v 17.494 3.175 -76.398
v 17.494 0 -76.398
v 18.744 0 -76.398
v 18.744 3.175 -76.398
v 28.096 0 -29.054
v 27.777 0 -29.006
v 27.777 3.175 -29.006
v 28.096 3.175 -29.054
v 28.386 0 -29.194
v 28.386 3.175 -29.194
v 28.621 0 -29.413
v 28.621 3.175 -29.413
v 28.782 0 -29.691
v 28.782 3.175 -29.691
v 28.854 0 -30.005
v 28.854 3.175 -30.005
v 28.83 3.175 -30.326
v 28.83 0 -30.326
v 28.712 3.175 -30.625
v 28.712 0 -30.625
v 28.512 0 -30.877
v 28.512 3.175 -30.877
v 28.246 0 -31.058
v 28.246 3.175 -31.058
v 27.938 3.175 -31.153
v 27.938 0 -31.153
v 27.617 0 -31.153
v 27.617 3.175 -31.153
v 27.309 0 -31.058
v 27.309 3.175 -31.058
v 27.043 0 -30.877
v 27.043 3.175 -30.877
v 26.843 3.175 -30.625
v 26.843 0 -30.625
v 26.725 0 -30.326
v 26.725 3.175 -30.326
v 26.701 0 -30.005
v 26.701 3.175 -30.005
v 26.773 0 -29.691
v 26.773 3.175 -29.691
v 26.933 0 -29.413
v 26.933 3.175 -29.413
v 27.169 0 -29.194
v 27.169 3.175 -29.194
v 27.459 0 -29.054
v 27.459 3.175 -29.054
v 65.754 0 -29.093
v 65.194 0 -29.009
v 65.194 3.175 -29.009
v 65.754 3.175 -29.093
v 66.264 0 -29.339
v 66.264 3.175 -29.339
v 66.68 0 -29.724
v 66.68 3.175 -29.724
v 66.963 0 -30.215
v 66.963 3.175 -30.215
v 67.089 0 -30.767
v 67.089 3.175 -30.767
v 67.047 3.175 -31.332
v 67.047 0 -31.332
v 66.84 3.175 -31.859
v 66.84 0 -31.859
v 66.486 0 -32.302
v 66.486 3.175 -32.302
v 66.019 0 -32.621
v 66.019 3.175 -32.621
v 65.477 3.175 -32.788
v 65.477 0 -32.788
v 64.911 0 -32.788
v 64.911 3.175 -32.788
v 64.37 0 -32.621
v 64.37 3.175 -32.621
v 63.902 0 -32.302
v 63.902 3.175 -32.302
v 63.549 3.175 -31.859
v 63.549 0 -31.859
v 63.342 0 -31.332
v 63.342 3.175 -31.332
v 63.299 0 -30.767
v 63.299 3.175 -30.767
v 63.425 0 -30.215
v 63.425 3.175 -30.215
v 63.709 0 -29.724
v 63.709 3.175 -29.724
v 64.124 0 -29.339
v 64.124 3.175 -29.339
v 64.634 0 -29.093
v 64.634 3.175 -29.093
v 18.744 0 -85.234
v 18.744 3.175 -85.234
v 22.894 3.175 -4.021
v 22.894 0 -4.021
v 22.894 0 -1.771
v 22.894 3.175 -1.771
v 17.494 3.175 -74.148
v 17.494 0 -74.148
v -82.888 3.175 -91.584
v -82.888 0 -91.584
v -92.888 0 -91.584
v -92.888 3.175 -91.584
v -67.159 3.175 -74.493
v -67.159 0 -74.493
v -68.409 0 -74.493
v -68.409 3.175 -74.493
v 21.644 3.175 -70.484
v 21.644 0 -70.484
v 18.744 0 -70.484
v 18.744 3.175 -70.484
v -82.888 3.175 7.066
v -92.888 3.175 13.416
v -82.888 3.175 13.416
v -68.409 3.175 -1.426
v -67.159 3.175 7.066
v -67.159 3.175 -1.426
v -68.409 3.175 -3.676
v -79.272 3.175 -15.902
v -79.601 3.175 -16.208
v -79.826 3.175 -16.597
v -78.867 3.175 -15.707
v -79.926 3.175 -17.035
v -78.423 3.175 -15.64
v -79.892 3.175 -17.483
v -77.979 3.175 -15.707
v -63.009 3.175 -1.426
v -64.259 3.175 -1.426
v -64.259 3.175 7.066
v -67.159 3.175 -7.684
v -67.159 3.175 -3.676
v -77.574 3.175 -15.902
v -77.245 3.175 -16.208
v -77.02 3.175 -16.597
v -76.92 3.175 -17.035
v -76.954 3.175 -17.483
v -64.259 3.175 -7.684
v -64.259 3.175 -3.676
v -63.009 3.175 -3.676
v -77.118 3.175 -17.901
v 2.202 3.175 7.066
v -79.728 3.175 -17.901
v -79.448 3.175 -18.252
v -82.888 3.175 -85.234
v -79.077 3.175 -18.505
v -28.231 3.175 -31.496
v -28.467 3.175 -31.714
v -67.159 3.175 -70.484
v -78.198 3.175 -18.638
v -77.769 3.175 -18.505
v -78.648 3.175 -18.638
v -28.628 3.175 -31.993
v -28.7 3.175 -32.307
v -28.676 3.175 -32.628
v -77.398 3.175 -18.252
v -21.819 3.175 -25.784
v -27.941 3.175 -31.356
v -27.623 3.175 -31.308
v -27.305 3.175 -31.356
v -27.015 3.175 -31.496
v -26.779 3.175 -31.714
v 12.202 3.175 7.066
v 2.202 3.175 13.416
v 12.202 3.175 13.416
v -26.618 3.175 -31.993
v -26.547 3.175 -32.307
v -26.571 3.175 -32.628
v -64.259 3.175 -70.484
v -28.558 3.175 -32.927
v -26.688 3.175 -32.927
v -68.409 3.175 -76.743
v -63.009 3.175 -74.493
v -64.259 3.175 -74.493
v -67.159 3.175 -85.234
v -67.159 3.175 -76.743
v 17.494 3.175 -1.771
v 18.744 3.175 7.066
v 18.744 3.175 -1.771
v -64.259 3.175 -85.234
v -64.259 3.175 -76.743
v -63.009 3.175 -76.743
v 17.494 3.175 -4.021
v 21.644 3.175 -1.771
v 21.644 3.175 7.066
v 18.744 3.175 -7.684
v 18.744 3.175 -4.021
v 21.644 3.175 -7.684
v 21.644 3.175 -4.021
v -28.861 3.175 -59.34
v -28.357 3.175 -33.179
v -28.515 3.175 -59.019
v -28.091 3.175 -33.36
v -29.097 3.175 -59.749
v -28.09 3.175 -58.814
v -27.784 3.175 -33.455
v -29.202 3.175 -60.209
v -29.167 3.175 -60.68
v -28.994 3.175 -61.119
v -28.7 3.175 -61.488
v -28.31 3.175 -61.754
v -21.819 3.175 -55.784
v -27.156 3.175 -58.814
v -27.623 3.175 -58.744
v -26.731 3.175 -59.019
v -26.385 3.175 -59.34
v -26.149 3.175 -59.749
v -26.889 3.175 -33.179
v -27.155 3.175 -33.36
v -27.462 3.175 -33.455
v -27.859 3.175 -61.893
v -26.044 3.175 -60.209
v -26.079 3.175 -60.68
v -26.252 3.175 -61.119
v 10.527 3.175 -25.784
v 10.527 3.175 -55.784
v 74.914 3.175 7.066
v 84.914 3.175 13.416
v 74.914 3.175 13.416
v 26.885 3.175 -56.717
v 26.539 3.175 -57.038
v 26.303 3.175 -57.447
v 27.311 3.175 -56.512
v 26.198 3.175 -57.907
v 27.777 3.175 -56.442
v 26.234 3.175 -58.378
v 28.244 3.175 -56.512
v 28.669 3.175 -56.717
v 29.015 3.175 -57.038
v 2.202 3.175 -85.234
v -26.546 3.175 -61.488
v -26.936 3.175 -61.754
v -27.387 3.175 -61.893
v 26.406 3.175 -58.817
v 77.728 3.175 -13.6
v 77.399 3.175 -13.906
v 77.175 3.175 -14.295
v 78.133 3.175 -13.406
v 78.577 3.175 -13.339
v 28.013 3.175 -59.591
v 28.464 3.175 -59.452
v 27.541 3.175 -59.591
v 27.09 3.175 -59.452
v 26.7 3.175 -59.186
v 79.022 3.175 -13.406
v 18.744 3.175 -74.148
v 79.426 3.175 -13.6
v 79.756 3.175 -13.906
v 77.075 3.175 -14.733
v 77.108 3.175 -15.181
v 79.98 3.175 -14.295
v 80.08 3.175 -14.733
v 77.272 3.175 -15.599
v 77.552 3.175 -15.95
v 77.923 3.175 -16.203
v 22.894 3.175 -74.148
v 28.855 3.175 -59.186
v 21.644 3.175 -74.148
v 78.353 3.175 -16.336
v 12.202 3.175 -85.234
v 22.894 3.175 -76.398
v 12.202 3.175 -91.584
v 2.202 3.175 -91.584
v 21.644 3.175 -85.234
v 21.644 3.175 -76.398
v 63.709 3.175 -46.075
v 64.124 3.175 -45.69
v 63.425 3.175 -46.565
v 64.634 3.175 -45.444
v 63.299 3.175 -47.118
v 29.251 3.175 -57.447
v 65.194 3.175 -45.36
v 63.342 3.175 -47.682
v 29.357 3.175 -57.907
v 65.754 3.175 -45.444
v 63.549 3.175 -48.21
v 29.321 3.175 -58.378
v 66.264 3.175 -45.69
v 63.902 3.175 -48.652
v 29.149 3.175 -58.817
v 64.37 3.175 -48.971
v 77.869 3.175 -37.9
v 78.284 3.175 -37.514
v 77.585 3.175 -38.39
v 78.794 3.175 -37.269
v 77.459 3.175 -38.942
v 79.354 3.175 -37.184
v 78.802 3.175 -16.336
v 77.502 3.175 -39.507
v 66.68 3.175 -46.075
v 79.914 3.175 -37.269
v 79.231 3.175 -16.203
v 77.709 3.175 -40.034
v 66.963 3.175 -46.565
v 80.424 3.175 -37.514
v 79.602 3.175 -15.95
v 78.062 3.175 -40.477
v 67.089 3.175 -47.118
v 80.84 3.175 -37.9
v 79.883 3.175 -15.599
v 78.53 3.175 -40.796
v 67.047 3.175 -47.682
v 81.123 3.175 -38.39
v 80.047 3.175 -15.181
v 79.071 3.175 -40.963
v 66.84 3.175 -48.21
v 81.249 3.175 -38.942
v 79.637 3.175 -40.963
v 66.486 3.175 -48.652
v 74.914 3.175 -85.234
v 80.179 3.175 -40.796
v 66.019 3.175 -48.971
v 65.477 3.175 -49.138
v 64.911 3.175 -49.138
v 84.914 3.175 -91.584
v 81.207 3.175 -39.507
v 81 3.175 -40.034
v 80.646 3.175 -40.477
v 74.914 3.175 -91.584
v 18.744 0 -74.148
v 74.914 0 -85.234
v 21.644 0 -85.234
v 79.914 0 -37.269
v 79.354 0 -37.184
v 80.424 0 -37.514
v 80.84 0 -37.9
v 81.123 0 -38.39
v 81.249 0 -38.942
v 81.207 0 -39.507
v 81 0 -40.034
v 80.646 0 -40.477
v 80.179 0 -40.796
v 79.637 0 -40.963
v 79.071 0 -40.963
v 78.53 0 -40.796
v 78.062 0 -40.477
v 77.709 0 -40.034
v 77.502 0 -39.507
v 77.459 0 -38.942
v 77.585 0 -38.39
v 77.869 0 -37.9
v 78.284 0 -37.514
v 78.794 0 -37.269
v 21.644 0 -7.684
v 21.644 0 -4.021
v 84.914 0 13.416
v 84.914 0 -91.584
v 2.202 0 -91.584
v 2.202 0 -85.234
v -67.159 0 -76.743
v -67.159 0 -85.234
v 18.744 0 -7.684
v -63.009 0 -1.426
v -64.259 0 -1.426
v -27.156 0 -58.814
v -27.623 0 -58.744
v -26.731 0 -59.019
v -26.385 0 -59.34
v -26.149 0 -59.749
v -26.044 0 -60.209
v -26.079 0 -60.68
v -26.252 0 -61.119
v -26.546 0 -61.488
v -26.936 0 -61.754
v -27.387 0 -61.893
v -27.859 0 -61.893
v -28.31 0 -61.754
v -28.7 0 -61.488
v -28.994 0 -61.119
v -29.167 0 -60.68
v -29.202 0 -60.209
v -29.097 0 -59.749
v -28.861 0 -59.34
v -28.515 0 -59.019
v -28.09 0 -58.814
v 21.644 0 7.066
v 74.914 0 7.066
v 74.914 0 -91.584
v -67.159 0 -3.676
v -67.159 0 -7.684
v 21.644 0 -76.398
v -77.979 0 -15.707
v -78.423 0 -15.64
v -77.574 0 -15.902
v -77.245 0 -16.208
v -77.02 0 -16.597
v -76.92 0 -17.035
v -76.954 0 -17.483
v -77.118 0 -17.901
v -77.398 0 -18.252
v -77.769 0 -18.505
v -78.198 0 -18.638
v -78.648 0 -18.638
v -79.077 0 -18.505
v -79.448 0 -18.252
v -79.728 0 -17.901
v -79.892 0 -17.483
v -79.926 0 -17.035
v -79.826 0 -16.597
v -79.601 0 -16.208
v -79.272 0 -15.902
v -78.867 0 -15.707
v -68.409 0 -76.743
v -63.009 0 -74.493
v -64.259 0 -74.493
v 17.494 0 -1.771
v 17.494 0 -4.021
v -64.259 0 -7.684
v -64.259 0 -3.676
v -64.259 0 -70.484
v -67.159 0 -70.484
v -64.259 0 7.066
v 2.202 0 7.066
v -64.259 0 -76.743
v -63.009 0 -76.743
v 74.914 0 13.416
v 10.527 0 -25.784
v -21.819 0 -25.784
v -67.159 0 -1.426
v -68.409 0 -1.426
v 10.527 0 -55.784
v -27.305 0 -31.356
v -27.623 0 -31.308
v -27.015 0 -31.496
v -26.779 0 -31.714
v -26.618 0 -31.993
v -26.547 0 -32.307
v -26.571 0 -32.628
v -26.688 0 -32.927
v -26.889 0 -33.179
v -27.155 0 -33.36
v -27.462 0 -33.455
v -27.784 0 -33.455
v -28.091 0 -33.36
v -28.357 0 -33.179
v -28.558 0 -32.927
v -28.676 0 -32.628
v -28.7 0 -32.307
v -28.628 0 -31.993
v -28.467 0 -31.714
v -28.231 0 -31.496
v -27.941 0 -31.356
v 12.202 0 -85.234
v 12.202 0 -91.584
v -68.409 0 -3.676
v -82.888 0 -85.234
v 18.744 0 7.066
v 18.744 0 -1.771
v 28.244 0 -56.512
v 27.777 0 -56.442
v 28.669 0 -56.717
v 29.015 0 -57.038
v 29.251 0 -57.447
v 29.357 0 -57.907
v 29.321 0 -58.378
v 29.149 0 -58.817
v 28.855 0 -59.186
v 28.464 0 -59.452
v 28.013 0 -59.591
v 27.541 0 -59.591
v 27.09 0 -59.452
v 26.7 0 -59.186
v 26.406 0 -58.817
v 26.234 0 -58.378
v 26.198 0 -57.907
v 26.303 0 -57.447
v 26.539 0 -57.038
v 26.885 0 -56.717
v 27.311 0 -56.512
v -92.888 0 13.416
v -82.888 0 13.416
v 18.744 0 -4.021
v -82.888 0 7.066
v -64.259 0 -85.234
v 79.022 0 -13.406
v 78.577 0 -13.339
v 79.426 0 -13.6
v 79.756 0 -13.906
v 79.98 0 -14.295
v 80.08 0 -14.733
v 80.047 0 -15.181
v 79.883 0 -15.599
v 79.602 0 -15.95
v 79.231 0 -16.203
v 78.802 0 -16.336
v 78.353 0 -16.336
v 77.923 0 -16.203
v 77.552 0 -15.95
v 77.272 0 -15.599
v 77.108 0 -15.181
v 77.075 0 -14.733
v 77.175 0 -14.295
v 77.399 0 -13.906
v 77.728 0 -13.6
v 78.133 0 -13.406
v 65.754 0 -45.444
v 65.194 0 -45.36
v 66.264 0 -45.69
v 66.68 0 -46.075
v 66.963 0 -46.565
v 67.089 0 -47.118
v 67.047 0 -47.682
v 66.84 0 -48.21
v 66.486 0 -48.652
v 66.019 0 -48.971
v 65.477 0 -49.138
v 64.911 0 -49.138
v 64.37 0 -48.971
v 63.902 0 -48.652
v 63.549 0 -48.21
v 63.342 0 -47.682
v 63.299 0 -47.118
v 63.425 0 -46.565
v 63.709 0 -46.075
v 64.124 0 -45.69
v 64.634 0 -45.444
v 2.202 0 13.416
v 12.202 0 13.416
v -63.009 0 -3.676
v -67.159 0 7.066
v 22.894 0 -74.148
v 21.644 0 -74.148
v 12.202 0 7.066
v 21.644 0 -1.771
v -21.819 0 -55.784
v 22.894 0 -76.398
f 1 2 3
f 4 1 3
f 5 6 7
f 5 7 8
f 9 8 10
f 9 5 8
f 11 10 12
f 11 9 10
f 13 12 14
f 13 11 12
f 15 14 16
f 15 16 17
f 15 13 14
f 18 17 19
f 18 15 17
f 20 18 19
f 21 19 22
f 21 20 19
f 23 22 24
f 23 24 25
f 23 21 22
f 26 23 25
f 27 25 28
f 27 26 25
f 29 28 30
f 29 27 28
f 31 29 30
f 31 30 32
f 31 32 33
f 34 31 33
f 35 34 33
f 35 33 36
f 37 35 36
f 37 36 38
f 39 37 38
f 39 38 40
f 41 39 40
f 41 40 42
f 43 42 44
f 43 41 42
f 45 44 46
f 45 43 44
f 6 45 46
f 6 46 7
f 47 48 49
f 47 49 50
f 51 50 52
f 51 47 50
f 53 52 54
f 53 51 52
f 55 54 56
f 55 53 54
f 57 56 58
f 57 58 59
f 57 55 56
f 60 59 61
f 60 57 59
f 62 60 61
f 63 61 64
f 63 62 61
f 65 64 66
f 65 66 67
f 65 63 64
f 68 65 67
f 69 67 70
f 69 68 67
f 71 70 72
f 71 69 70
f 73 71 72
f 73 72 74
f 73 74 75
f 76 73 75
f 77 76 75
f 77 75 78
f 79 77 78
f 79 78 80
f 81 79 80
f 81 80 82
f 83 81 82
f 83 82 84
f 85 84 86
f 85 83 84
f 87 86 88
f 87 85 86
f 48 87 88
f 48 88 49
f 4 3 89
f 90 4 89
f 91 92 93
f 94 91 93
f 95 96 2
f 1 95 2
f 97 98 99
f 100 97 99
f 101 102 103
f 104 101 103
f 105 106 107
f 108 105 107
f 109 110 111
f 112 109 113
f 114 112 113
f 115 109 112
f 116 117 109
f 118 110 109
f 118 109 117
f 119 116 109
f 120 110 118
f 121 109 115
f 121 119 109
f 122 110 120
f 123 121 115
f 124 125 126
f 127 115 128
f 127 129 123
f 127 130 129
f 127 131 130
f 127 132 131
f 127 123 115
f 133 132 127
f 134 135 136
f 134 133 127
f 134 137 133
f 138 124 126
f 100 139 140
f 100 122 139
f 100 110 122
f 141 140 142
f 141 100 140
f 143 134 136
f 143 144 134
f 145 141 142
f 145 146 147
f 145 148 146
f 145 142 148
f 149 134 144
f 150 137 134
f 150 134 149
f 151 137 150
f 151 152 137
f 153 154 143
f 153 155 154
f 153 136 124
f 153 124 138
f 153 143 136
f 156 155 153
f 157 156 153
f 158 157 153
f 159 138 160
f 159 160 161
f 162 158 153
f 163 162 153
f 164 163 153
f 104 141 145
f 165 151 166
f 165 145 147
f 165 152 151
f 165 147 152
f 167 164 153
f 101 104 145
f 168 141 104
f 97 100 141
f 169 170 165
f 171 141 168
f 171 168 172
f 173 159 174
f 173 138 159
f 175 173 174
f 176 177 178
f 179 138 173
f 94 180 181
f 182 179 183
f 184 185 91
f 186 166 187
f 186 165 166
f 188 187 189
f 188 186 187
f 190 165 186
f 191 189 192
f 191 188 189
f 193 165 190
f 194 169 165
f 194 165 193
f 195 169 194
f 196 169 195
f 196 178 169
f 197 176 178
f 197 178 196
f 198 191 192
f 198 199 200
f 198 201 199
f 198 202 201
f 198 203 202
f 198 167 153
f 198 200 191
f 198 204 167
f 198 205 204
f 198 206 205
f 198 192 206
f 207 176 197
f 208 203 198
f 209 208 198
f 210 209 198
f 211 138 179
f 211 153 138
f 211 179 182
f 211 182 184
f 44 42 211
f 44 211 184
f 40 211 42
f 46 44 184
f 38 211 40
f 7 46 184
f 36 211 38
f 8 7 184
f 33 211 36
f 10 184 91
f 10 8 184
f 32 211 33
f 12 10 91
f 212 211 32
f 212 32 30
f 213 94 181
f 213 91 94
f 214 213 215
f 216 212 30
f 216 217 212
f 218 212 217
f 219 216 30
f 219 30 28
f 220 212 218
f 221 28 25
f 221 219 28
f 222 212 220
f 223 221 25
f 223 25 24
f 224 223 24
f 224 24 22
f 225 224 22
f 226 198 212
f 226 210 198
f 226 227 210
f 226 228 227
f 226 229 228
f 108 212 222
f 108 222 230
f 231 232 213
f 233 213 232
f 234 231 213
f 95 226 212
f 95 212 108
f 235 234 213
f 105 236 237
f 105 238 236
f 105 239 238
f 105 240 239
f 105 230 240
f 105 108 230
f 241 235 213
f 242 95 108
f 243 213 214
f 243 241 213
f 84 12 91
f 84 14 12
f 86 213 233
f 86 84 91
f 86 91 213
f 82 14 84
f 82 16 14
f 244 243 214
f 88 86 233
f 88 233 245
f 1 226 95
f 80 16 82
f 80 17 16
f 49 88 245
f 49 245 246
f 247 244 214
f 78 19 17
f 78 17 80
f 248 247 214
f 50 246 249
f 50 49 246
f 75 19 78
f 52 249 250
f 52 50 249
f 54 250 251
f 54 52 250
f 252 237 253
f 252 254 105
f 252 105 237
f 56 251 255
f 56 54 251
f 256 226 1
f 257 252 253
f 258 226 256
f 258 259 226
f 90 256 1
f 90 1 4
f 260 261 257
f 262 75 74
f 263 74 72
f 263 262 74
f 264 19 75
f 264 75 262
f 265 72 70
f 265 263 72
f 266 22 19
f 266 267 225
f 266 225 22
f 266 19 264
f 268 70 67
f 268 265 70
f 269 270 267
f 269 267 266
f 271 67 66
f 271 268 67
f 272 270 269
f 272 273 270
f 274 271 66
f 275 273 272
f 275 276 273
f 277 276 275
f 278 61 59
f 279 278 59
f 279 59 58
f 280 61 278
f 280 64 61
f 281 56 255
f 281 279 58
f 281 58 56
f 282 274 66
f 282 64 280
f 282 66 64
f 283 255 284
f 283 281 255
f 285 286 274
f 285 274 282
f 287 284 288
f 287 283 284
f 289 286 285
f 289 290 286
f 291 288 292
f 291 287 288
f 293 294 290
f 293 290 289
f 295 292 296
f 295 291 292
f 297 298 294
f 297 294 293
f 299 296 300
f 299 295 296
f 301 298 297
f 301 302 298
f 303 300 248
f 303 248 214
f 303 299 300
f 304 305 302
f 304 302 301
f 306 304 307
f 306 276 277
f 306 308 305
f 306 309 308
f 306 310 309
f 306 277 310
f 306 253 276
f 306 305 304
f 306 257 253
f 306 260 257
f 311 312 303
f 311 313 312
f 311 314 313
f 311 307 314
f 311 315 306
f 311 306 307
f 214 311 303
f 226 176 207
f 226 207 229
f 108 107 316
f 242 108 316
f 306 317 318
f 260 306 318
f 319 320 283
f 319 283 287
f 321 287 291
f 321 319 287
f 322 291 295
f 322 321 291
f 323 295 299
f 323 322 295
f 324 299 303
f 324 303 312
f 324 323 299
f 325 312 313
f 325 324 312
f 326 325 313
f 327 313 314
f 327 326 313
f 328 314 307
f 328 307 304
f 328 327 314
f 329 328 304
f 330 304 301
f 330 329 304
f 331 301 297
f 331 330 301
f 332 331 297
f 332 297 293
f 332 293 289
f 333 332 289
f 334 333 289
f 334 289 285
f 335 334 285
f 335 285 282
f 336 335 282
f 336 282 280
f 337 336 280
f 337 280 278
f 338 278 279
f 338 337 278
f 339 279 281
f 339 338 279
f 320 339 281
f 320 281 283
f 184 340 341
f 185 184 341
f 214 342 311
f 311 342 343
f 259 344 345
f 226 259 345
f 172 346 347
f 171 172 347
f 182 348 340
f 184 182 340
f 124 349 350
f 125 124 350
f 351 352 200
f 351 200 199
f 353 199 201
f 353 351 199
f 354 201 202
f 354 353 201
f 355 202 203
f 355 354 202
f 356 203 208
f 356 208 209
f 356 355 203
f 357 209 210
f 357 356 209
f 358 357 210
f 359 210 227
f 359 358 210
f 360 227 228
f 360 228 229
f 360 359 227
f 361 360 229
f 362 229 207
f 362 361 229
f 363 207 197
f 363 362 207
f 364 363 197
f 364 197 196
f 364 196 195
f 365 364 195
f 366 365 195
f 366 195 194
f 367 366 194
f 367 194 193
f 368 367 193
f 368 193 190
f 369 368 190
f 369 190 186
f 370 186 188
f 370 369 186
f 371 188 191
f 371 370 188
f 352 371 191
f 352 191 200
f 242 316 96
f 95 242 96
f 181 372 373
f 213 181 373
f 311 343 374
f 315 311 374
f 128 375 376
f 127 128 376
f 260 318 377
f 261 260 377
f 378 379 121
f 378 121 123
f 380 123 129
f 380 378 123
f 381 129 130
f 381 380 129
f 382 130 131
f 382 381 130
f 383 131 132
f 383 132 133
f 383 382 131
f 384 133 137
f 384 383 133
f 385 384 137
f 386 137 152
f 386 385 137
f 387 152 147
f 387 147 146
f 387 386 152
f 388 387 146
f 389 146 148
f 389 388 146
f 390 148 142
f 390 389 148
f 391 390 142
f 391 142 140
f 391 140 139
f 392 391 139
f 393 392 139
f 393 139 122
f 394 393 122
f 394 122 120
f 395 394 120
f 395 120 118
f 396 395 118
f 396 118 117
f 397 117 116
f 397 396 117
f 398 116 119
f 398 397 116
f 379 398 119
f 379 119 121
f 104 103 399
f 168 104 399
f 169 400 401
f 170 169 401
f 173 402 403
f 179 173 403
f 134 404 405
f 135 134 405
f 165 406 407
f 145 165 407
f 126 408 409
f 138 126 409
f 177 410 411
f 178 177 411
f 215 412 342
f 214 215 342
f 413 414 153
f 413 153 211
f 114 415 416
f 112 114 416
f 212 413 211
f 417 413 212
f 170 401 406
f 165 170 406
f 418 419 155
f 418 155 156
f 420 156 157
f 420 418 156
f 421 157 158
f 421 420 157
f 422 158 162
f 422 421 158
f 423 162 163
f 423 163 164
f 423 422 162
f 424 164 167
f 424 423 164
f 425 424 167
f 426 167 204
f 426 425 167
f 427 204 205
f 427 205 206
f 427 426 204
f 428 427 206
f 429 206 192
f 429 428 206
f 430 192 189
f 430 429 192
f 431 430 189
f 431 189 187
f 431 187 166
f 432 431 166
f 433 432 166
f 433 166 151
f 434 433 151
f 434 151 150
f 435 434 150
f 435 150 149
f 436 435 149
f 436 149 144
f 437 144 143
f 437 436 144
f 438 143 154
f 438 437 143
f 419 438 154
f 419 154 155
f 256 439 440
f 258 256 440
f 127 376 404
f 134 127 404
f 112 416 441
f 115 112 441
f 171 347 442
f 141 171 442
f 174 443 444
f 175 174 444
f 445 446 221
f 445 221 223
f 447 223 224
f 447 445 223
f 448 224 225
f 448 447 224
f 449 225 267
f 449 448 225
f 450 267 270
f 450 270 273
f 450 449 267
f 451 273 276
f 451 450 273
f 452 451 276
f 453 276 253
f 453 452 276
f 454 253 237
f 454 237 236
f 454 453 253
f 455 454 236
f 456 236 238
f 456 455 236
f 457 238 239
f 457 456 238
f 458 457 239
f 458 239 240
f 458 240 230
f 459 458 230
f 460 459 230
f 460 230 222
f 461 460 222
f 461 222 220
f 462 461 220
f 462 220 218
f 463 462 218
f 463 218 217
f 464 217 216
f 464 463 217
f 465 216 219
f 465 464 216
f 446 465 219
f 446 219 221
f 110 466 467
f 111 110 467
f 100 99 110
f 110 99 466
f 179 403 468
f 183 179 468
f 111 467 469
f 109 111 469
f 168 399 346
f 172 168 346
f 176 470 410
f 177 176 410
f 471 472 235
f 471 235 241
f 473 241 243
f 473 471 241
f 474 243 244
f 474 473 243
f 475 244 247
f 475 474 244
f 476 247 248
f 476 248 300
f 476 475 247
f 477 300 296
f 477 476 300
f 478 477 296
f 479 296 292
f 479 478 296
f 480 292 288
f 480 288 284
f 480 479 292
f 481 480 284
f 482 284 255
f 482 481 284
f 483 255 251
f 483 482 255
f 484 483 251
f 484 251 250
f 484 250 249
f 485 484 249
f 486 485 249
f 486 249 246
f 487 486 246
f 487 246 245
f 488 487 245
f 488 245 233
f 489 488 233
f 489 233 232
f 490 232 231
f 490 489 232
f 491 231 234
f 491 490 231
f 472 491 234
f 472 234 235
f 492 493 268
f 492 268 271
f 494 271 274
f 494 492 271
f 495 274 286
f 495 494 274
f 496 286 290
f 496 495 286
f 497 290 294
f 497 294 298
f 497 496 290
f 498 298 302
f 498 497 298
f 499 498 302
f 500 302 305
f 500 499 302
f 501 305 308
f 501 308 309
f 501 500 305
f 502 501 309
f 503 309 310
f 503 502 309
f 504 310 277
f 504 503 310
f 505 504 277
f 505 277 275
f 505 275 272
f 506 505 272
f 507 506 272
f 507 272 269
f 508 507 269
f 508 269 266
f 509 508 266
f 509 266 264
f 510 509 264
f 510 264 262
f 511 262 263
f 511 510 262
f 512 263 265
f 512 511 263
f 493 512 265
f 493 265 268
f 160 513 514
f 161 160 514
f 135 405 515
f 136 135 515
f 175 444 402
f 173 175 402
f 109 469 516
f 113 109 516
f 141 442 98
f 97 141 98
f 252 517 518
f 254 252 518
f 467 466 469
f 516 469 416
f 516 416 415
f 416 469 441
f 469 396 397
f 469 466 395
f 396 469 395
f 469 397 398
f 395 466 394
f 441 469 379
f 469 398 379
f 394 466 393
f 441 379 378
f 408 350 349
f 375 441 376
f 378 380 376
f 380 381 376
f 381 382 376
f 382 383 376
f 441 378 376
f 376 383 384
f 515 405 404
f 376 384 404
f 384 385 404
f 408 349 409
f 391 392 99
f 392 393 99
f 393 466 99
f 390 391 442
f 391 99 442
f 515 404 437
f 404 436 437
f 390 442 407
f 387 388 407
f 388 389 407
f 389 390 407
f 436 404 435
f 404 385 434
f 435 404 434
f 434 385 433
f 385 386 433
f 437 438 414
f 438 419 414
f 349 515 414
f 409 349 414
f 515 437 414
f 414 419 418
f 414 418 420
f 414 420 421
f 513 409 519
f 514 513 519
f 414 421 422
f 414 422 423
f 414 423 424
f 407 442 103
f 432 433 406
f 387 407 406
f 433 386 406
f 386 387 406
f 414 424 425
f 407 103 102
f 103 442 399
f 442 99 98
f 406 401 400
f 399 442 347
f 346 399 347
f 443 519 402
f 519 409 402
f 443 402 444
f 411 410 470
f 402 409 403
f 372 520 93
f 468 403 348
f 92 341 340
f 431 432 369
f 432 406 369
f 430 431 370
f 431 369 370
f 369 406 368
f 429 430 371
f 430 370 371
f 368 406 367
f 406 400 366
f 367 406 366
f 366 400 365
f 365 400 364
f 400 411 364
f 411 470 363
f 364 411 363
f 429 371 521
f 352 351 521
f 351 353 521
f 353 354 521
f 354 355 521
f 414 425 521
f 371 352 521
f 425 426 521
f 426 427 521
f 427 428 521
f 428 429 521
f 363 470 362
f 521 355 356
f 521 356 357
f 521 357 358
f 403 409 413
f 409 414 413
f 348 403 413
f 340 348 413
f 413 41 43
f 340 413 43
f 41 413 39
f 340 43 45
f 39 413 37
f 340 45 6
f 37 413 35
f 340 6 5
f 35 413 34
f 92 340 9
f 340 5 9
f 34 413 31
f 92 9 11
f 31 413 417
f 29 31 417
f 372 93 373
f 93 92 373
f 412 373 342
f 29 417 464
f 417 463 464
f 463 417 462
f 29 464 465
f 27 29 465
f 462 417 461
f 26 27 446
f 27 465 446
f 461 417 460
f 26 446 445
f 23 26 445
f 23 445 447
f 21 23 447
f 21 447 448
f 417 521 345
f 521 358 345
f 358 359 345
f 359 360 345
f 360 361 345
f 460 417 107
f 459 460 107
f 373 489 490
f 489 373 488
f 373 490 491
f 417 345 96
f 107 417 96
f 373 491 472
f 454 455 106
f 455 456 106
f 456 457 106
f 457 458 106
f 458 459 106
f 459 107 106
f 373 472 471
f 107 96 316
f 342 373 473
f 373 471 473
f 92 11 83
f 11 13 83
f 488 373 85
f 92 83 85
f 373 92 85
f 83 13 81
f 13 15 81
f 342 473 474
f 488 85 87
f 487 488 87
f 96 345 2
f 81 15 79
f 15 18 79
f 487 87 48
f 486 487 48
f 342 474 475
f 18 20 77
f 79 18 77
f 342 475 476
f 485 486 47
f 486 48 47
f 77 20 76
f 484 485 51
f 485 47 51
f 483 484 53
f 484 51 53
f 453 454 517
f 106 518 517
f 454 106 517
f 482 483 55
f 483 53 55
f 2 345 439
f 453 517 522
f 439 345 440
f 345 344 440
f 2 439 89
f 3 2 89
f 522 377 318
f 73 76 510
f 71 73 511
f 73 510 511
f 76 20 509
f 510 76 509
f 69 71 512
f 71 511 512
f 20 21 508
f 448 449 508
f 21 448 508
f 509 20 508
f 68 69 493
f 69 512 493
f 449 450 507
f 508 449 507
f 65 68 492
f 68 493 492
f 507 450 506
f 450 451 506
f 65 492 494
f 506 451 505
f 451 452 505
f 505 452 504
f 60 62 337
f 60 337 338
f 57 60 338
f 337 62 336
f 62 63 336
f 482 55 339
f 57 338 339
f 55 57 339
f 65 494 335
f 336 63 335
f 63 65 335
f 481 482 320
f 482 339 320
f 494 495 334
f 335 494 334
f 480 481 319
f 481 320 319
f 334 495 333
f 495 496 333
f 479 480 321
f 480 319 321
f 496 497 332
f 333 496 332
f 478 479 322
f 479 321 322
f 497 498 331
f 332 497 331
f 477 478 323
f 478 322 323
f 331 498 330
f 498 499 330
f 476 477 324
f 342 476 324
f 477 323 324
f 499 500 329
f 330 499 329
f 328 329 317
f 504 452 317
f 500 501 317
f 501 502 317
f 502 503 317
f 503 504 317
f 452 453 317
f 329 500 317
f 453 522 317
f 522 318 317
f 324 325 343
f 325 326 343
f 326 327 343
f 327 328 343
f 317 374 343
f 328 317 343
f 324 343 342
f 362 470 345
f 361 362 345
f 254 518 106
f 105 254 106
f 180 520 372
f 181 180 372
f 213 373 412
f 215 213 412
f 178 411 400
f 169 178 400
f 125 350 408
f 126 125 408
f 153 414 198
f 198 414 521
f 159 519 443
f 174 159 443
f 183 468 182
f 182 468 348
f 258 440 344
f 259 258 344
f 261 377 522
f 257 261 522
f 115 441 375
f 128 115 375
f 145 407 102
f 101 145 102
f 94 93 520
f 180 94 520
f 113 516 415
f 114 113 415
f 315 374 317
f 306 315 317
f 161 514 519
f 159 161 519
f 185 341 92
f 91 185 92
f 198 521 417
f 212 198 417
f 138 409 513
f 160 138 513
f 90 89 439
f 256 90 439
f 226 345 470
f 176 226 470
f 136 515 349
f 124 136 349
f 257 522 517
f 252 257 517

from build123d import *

# Parameters (mm, degrees)
SKETCH1_R      = 1.9
SKETCH1_R_2    = 1.58353158
SKETCH1_R_3    = 1.50705101
SKETCH1_R_4    = 1.0795
SKETCH1_W      = 32.345315457
SKETCH1_H      = 30
EXTRUDE1_DEPTH = 3.175


with BuildPart() as part:
    # Sketch1 → Extrude1 (new body)
    with BuildSketch(Plane(origin=(0, 0, 0), x_dir=(1, 0, 0), z_dir=(0, 1, 0))):
        Polygon((-67.158636898, 70.484310302), (-67.158636898, 74.492800404), (-68.408636898, 74.492800404), (-68.408636898, 76.742800404), (-67.158636898, 76.742800404), (-67.158636898, 85.234310302), (-82.88813161, 85.234310302), (-82.88813161, 91.584310302), (-92.88813161, 91.584310302), (-92.88813161, -13.415689698), (-82.88813161, -13.415689698), (-82.88813161, -7.065689698), (-67.158636898, -7.065689698), (-67.158636898, 1.425820201), (-68.408636898, 1.425820201), (-68.408636898, 3.675820201), (-67.158636898, 3.675820201), (-67.158636898, 7.684310302), (-64.258636898, 7.684310302), (-64.258636898, 3.675820201), (-63.008636898, 3.675820201), (-63.008636898, 1.425820201), (-64.258636898, 1.425820201), (-64.258636898, -7.065689698), (2.20186839, -7.065689698), (2.20186839, -13.415689698), (12.20186839, -13.415689698), (12.20186839, -7.065689698), (18.744143558, -7.065689698), (18.744143558, 1.771032224), (17.494143558, 1.771032224), (17.494143558, 4.021032224), (18.744143558, 4.021032224), (18.744143558, 7.684310302), (21.644143558, 7.684310302), (21.644143558, 4.021032224), (22.894143558, 4.021032224), (22.894143558, 1.771032224), (21.644143558, 1.771032224), (21.644143558, -7.065689698), (74.914143558, -7.065689698), (74.914143558, -13.415689698), (84.914143558, -13.415689698), (84.914143558, 91.584310302), (74.914143558, 91.584310302), (74.914143558, 85.234310302), (21.644143558, 85.234310302), (21.644143558, 76.397588381), (22.894143558, 76.397588381), (22.894143558, 74.147588381), (21.644143558, 74.147588381), (21.644143558, 70.484310302), (18.744143558, 70.484310302), (18.744143558, 74.147588381), (17.494143558, 74.147588381), (17.494143558, 76.397588381), (18.744143558, 76.397588381), (18.744143558, 85.234310302), (12.20186839, 85.234310302), (12.20186839, 91.584310302), (2.20186839, 91.584310302), (2.20186839, 85.234310302), (-64.258636898, 85.234310302), (-64.258636898, 76.742800404), (-63.008636898, 76.742800404), (-63.008636898, 74.492800404), (-64.258636898, 74.492800404), (-64.258636898, 70.484310302), align=None)
        with Locations(Location((79.354143558, 39.084310302, 0), (0, 0, 270))):
            Circle(SKETCH1_R, mode=Mode.SUBTRACT)
        with Locations(Location((65.194143558, 30.909030491, 0), (0, 0, 270))):
            Circle(SKETCH1_R, mode=Mode.SUBTRACT)
        with Locations(Location((65.194143558, 47.259590114, 0), (0, 0, 270))):
            Circle(SKETCH1_R, mode=Mode.SUBTRACT)
        with Locations(Location((27.777428137, 58.025608002, 0), (0, 0, 270))):
            Circle(SKETCH1_R_2, mode=Mode.SUBTRACT)
        with Locations(Location((78.577377337, 14.845608002, 0), (0, 0, 270))):
            Circle(SKETCH1_R_3, mode=Mode.SUBTRACT)
        with Locations(Location((27.777428137, 30.085608002, 0), (0, 0, 270))):
            Circle(SKETCH1_R_4, mode=Mode.SUBTRACT)
        with Locations(Location((-78.42302428, 17.147481819, 0), (0, 0, 270))):
            Circle(SKETCH1_R_3, mode=Mode.SUBTRACT)
        with Locations(Location((-27.62307508, 32.387481819, 0), (0, 0, 270))):
            Circle(SKETCH1_R_4, mode=Mode.SUBTRACT)
        with Locations(Location((-27.62307508, 60.327481819, 0), (0, 0, 270))):
            Circle(SKETCH1_R_2, mode=Mode.SUBTRACT)
        with Locations((-5.646064502, 40.784310302)):
            Rectangle(SKETCH1_W, SKETCH1_H, mode=Mode.SUBTRACT)
    extrude(amount=EXTRUDE1_DEPTH)


solid = part.part
